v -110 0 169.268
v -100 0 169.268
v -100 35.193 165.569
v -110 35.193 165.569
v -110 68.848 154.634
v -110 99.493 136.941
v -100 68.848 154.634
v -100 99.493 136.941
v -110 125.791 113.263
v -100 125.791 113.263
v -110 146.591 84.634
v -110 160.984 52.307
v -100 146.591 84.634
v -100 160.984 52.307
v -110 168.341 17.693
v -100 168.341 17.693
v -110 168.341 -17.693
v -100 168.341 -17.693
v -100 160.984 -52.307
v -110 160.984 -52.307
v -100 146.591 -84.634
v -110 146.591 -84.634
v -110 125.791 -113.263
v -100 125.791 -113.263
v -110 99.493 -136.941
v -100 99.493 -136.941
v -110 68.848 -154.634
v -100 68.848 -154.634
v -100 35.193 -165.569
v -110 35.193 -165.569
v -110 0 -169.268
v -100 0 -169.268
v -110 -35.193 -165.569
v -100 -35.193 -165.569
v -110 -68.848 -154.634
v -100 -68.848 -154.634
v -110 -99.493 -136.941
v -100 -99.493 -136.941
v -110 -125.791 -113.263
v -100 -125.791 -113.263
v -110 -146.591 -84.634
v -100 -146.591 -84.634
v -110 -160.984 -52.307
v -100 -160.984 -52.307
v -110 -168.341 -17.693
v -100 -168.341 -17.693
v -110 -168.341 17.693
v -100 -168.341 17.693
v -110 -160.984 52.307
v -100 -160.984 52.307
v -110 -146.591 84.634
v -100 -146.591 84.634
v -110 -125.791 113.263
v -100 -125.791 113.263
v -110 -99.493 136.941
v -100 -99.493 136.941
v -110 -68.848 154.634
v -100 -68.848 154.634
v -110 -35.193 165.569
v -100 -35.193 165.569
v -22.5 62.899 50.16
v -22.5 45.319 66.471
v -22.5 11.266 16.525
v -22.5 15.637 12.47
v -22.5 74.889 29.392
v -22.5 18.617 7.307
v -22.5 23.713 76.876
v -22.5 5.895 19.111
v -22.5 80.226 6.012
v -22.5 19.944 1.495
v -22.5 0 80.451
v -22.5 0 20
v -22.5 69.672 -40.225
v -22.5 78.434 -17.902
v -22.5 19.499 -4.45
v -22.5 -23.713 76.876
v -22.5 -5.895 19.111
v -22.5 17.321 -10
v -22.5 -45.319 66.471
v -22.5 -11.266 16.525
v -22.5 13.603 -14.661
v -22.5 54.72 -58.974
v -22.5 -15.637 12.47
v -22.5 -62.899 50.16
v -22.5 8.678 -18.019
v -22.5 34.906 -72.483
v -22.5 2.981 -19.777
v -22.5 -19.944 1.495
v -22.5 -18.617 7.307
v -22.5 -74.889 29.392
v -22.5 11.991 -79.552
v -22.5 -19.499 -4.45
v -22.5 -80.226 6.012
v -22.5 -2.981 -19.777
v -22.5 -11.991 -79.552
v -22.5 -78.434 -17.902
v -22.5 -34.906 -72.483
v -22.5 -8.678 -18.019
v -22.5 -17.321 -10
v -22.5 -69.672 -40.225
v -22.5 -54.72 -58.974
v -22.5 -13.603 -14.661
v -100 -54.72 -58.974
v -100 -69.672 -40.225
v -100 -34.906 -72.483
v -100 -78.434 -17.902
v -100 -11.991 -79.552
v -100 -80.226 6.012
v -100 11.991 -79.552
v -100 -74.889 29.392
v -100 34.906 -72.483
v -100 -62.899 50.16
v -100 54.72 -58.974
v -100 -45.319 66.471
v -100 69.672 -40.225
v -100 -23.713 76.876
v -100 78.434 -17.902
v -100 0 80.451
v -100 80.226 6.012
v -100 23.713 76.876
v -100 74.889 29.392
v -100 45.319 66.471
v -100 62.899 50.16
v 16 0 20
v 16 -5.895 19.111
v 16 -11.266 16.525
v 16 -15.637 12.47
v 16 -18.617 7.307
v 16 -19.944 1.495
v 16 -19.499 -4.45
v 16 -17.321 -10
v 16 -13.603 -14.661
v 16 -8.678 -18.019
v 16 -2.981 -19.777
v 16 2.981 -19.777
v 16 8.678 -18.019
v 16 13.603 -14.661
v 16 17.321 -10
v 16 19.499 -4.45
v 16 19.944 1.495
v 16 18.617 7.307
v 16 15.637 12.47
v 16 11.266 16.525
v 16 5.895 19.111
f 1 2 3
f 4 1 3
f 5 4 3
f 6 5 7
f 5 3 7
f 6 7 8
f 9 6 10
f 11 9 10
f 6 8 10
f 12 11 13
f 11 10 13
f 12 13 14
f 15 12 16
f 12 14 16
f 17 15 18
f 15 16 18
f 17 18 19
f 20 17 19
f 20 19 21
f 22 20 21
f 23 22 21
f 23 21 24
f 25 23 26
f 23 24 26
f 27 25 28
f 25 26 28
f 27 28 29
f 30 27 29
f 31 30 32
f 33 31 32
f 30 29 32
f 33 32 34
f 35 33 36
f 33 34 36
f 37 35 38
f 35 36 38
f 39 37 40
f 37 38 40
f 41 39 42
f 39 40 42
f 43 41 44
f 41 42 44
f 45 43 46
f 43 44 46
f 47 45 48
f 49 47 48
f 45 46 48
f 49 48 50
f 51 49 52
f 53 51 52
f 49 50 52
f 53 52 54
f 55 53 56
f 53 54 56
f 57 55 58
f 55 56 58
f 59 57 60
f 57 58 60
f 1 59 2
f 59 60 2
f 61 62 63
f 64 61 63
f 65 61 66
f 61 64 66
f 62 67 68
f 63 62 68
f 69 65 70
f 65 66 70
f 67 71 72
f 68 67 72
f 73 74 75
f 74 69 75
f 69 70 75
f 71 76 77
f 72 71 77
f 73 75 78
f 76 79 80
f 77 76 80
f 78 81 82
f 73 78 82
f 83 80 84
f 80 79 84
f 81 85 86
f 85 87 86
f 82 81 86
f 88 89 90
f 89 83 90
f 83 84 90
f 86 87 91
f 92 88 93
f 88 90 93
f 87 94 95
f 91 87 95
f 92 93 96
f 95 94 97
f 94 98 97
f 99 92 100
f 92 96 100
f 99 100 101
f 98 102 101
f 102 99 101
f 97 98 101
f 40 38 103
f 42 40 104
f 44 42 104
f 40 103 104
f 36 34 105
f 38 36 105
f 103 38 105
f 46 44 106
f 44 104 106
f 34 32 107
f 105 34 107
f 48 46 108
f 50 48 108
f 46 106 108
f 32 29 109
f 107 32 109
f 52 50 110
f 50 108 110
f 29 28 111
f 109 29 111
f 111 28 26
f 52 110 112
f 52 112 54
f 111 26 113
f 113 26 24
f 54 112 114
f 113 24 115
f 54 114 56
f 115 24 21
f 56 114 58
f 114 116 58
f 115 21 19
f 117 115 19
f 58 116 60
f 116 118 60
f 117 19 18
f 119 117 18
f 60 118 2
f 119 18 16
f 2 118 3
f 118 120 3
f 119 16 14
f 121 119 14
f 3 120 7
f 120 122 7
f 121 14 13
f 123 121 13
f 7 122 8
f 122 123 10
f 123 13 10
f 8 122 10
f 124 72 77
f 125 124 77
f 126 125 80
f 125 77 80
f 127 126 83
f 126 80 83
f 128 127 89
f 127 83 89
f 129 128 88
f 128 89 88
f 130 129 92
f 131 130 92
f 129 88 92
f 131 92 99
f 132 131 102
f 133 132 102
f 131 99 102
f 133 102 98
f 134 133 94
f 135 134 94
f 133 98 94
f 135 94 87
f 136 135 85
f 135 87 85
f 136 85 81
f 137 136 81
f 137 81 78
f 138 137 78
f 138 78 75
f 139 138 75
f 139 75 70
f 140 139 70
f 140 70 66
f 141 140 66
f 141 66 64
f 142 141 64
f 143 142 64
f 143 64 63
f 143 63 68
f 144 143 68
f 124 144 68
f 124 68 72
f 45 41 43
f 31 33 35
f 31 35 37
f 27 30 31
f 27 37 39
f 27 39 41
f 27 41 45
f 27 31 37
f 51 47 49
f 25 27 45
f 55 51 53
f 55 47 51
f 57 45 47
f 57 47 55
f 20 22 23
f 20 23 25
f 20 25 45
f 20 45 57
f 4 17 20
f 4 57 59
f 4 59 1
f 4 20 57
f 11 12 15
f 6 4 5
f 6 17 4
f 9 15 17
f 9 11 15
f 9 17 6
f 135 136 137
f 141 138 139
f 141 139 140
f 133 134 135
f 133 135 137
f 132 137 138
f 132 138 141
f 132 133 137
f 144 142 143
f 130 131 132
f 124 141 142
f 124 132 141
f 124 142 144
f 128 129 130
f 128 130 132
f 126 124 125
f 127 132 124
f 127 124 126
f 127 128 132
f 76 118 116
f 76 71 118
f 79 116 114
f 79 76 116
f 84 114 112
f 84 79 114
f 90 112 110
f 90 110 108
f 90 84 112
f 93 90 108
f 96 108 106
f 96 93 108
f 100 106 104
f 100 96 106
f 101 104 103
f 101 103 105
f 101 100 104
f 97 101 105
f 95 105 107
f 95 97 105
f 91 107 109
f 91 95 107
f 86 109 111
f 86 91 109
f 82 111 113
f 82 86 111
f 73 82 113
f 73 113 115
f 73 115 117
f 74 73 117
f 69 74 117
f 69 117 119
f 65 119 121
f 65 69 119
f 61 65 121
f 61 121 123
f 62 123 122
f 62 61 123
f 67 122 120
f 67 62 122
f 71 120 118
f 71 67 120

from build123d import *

# Parameters (mm, degrees)
SKETCH1_R               = 50
BOSS_EXTRUDE1_DEPTH     = 140
SKETCH2_W               = 10
SKETCH2_H               = 60
BOSS_EXTRUDE2_START     = 100
SKETCH3_R               = 50
BOSS_EXTRUDE2_DEPTH     = 100
SKETCH4_R               = 169.268161275
BOSS_EXTRUDE3_DEPTH     = 10
FILLET2_R               = 50
CUT_EXTRUDE1_DEPTH      = 278.314660346
CUT_EXTRUDE1_DEPTH_BACK = 278.314660346
SKETCH5_W               = 561.706839888
SKETCH5_H               = 604.768431274
SKETCH6_R               = 20
BOSS_EXTRUDE4_DEPTH     = 116
SKETCH7_W               = 77.5
SKETCH7_H               = 80.450571877


with BuildPart() as part:
    # Sketch1 → Boss-Extrude1 (new body)
    with BuildSketch(Plane(origin=(0, 0, 0), x_dir=(0, 0, -1), z_dir=(1, 0, 0))):
        Circle(SKETCH1_R)
    extrude(amount=BOSS_EXTRUDE1_DEPTH)

    # Sketch2 → Revolve1 (revolve)
    with BuildSketch(Plane(origin=(0, 0, 0), x_dir=(1, 0, 0), z_dir=(0, 1, 0)), mode=Mode.PRIVATE) as revolve1_sk:
        with Locations((15, 30)):
            Rectangle(SKETCH2_W, SKETCH2_H)
        with Locations((125, 30)):
            Rectangle(SKETCH2_W, SKETCH2_H)
    revolve(revolve1_sk.sketch.rotate(Axis((0, 0, 0), (1, 0, 0)), 180), axis=Axis((0, 0, 0), (1, 0, 0)))

    # Sketch3 → Boss-Extrude2 (add)
    with BuildSketch(Plane.ZY.offset(BOSS_EXTRUDE2_START)):
        Circle(SKETCH3_R)
    extrude(amount=-BOSS_EXTRUDE2_DEPTH)

    # Sketch4 → Boss-Extrude3 (add)
    with BuildSketch(Plane.ZY.offset(100)):
        Circle(SKETCH4_R)
    extrude(amount=BOSS_EXTRUDE3_DEPTH)

    # Fillet2
    fillet2_edges = [part.edges().sort_by_distance(p)[0] for p in [
        (-100, 0, -50),
    ]]
    fillet(fillet2_edges, radius=FILLET2_R)

    # Sketch5 → Cut-Extrude1 (cut, two sides: drawn at the far end of the back side and taken through both)
    with BuildSketch(Plane(origin=(0, 0, 0), x_dir=(1, 0, 0), z_dir=(0, 1, 0)).offset(-CUT_EXTRUDE1_DEPTH_BACK)):
        with Locations((180.853419944, 0)):
            Rectangle(SKETCH5_W, SKETCH5_H)
    extrude(amount=CUT_EXTRUDE1_DEPTH + CUT_EXTRUDE1_DEPTH_BACK, mode=Mode.SUBTRACT)

    # Sketch6 → Boss-Extrude4 (add)
    with BuildSketch(Plane(origin=(-100, 0, 0), x_dir=(0, 0, -1), z_dir=(1, 0, 0))):
        with Locations(Location((0, 0, 0), (0, 0, 180))):
            Circle(SKETCH6_R)
    extrude(amount=BOSS_EXTRUDE4_DEPTH)

    # Sketch7 → Revolve2 (revolve)
    with BuildSketch(Plane(origin=(0, 0, 0), x_dir=(1, 0, 0), z_dir=(0, 1, 0)), mode=Mode.PRIVATE) as revolve2_sk:
        with Locations((-61.25, 40.225285939)):
            Rectangle(SKETCH7_W, SKETCH7_H)
    revolve(revolve2_sk.sketch.rotate(Axis((-151.154136958, 0, 0), (1, 0, 0)), 180), axis=Axis((-151.154136958, 0, 0), (1, 0, 0)))


solid = part.part
